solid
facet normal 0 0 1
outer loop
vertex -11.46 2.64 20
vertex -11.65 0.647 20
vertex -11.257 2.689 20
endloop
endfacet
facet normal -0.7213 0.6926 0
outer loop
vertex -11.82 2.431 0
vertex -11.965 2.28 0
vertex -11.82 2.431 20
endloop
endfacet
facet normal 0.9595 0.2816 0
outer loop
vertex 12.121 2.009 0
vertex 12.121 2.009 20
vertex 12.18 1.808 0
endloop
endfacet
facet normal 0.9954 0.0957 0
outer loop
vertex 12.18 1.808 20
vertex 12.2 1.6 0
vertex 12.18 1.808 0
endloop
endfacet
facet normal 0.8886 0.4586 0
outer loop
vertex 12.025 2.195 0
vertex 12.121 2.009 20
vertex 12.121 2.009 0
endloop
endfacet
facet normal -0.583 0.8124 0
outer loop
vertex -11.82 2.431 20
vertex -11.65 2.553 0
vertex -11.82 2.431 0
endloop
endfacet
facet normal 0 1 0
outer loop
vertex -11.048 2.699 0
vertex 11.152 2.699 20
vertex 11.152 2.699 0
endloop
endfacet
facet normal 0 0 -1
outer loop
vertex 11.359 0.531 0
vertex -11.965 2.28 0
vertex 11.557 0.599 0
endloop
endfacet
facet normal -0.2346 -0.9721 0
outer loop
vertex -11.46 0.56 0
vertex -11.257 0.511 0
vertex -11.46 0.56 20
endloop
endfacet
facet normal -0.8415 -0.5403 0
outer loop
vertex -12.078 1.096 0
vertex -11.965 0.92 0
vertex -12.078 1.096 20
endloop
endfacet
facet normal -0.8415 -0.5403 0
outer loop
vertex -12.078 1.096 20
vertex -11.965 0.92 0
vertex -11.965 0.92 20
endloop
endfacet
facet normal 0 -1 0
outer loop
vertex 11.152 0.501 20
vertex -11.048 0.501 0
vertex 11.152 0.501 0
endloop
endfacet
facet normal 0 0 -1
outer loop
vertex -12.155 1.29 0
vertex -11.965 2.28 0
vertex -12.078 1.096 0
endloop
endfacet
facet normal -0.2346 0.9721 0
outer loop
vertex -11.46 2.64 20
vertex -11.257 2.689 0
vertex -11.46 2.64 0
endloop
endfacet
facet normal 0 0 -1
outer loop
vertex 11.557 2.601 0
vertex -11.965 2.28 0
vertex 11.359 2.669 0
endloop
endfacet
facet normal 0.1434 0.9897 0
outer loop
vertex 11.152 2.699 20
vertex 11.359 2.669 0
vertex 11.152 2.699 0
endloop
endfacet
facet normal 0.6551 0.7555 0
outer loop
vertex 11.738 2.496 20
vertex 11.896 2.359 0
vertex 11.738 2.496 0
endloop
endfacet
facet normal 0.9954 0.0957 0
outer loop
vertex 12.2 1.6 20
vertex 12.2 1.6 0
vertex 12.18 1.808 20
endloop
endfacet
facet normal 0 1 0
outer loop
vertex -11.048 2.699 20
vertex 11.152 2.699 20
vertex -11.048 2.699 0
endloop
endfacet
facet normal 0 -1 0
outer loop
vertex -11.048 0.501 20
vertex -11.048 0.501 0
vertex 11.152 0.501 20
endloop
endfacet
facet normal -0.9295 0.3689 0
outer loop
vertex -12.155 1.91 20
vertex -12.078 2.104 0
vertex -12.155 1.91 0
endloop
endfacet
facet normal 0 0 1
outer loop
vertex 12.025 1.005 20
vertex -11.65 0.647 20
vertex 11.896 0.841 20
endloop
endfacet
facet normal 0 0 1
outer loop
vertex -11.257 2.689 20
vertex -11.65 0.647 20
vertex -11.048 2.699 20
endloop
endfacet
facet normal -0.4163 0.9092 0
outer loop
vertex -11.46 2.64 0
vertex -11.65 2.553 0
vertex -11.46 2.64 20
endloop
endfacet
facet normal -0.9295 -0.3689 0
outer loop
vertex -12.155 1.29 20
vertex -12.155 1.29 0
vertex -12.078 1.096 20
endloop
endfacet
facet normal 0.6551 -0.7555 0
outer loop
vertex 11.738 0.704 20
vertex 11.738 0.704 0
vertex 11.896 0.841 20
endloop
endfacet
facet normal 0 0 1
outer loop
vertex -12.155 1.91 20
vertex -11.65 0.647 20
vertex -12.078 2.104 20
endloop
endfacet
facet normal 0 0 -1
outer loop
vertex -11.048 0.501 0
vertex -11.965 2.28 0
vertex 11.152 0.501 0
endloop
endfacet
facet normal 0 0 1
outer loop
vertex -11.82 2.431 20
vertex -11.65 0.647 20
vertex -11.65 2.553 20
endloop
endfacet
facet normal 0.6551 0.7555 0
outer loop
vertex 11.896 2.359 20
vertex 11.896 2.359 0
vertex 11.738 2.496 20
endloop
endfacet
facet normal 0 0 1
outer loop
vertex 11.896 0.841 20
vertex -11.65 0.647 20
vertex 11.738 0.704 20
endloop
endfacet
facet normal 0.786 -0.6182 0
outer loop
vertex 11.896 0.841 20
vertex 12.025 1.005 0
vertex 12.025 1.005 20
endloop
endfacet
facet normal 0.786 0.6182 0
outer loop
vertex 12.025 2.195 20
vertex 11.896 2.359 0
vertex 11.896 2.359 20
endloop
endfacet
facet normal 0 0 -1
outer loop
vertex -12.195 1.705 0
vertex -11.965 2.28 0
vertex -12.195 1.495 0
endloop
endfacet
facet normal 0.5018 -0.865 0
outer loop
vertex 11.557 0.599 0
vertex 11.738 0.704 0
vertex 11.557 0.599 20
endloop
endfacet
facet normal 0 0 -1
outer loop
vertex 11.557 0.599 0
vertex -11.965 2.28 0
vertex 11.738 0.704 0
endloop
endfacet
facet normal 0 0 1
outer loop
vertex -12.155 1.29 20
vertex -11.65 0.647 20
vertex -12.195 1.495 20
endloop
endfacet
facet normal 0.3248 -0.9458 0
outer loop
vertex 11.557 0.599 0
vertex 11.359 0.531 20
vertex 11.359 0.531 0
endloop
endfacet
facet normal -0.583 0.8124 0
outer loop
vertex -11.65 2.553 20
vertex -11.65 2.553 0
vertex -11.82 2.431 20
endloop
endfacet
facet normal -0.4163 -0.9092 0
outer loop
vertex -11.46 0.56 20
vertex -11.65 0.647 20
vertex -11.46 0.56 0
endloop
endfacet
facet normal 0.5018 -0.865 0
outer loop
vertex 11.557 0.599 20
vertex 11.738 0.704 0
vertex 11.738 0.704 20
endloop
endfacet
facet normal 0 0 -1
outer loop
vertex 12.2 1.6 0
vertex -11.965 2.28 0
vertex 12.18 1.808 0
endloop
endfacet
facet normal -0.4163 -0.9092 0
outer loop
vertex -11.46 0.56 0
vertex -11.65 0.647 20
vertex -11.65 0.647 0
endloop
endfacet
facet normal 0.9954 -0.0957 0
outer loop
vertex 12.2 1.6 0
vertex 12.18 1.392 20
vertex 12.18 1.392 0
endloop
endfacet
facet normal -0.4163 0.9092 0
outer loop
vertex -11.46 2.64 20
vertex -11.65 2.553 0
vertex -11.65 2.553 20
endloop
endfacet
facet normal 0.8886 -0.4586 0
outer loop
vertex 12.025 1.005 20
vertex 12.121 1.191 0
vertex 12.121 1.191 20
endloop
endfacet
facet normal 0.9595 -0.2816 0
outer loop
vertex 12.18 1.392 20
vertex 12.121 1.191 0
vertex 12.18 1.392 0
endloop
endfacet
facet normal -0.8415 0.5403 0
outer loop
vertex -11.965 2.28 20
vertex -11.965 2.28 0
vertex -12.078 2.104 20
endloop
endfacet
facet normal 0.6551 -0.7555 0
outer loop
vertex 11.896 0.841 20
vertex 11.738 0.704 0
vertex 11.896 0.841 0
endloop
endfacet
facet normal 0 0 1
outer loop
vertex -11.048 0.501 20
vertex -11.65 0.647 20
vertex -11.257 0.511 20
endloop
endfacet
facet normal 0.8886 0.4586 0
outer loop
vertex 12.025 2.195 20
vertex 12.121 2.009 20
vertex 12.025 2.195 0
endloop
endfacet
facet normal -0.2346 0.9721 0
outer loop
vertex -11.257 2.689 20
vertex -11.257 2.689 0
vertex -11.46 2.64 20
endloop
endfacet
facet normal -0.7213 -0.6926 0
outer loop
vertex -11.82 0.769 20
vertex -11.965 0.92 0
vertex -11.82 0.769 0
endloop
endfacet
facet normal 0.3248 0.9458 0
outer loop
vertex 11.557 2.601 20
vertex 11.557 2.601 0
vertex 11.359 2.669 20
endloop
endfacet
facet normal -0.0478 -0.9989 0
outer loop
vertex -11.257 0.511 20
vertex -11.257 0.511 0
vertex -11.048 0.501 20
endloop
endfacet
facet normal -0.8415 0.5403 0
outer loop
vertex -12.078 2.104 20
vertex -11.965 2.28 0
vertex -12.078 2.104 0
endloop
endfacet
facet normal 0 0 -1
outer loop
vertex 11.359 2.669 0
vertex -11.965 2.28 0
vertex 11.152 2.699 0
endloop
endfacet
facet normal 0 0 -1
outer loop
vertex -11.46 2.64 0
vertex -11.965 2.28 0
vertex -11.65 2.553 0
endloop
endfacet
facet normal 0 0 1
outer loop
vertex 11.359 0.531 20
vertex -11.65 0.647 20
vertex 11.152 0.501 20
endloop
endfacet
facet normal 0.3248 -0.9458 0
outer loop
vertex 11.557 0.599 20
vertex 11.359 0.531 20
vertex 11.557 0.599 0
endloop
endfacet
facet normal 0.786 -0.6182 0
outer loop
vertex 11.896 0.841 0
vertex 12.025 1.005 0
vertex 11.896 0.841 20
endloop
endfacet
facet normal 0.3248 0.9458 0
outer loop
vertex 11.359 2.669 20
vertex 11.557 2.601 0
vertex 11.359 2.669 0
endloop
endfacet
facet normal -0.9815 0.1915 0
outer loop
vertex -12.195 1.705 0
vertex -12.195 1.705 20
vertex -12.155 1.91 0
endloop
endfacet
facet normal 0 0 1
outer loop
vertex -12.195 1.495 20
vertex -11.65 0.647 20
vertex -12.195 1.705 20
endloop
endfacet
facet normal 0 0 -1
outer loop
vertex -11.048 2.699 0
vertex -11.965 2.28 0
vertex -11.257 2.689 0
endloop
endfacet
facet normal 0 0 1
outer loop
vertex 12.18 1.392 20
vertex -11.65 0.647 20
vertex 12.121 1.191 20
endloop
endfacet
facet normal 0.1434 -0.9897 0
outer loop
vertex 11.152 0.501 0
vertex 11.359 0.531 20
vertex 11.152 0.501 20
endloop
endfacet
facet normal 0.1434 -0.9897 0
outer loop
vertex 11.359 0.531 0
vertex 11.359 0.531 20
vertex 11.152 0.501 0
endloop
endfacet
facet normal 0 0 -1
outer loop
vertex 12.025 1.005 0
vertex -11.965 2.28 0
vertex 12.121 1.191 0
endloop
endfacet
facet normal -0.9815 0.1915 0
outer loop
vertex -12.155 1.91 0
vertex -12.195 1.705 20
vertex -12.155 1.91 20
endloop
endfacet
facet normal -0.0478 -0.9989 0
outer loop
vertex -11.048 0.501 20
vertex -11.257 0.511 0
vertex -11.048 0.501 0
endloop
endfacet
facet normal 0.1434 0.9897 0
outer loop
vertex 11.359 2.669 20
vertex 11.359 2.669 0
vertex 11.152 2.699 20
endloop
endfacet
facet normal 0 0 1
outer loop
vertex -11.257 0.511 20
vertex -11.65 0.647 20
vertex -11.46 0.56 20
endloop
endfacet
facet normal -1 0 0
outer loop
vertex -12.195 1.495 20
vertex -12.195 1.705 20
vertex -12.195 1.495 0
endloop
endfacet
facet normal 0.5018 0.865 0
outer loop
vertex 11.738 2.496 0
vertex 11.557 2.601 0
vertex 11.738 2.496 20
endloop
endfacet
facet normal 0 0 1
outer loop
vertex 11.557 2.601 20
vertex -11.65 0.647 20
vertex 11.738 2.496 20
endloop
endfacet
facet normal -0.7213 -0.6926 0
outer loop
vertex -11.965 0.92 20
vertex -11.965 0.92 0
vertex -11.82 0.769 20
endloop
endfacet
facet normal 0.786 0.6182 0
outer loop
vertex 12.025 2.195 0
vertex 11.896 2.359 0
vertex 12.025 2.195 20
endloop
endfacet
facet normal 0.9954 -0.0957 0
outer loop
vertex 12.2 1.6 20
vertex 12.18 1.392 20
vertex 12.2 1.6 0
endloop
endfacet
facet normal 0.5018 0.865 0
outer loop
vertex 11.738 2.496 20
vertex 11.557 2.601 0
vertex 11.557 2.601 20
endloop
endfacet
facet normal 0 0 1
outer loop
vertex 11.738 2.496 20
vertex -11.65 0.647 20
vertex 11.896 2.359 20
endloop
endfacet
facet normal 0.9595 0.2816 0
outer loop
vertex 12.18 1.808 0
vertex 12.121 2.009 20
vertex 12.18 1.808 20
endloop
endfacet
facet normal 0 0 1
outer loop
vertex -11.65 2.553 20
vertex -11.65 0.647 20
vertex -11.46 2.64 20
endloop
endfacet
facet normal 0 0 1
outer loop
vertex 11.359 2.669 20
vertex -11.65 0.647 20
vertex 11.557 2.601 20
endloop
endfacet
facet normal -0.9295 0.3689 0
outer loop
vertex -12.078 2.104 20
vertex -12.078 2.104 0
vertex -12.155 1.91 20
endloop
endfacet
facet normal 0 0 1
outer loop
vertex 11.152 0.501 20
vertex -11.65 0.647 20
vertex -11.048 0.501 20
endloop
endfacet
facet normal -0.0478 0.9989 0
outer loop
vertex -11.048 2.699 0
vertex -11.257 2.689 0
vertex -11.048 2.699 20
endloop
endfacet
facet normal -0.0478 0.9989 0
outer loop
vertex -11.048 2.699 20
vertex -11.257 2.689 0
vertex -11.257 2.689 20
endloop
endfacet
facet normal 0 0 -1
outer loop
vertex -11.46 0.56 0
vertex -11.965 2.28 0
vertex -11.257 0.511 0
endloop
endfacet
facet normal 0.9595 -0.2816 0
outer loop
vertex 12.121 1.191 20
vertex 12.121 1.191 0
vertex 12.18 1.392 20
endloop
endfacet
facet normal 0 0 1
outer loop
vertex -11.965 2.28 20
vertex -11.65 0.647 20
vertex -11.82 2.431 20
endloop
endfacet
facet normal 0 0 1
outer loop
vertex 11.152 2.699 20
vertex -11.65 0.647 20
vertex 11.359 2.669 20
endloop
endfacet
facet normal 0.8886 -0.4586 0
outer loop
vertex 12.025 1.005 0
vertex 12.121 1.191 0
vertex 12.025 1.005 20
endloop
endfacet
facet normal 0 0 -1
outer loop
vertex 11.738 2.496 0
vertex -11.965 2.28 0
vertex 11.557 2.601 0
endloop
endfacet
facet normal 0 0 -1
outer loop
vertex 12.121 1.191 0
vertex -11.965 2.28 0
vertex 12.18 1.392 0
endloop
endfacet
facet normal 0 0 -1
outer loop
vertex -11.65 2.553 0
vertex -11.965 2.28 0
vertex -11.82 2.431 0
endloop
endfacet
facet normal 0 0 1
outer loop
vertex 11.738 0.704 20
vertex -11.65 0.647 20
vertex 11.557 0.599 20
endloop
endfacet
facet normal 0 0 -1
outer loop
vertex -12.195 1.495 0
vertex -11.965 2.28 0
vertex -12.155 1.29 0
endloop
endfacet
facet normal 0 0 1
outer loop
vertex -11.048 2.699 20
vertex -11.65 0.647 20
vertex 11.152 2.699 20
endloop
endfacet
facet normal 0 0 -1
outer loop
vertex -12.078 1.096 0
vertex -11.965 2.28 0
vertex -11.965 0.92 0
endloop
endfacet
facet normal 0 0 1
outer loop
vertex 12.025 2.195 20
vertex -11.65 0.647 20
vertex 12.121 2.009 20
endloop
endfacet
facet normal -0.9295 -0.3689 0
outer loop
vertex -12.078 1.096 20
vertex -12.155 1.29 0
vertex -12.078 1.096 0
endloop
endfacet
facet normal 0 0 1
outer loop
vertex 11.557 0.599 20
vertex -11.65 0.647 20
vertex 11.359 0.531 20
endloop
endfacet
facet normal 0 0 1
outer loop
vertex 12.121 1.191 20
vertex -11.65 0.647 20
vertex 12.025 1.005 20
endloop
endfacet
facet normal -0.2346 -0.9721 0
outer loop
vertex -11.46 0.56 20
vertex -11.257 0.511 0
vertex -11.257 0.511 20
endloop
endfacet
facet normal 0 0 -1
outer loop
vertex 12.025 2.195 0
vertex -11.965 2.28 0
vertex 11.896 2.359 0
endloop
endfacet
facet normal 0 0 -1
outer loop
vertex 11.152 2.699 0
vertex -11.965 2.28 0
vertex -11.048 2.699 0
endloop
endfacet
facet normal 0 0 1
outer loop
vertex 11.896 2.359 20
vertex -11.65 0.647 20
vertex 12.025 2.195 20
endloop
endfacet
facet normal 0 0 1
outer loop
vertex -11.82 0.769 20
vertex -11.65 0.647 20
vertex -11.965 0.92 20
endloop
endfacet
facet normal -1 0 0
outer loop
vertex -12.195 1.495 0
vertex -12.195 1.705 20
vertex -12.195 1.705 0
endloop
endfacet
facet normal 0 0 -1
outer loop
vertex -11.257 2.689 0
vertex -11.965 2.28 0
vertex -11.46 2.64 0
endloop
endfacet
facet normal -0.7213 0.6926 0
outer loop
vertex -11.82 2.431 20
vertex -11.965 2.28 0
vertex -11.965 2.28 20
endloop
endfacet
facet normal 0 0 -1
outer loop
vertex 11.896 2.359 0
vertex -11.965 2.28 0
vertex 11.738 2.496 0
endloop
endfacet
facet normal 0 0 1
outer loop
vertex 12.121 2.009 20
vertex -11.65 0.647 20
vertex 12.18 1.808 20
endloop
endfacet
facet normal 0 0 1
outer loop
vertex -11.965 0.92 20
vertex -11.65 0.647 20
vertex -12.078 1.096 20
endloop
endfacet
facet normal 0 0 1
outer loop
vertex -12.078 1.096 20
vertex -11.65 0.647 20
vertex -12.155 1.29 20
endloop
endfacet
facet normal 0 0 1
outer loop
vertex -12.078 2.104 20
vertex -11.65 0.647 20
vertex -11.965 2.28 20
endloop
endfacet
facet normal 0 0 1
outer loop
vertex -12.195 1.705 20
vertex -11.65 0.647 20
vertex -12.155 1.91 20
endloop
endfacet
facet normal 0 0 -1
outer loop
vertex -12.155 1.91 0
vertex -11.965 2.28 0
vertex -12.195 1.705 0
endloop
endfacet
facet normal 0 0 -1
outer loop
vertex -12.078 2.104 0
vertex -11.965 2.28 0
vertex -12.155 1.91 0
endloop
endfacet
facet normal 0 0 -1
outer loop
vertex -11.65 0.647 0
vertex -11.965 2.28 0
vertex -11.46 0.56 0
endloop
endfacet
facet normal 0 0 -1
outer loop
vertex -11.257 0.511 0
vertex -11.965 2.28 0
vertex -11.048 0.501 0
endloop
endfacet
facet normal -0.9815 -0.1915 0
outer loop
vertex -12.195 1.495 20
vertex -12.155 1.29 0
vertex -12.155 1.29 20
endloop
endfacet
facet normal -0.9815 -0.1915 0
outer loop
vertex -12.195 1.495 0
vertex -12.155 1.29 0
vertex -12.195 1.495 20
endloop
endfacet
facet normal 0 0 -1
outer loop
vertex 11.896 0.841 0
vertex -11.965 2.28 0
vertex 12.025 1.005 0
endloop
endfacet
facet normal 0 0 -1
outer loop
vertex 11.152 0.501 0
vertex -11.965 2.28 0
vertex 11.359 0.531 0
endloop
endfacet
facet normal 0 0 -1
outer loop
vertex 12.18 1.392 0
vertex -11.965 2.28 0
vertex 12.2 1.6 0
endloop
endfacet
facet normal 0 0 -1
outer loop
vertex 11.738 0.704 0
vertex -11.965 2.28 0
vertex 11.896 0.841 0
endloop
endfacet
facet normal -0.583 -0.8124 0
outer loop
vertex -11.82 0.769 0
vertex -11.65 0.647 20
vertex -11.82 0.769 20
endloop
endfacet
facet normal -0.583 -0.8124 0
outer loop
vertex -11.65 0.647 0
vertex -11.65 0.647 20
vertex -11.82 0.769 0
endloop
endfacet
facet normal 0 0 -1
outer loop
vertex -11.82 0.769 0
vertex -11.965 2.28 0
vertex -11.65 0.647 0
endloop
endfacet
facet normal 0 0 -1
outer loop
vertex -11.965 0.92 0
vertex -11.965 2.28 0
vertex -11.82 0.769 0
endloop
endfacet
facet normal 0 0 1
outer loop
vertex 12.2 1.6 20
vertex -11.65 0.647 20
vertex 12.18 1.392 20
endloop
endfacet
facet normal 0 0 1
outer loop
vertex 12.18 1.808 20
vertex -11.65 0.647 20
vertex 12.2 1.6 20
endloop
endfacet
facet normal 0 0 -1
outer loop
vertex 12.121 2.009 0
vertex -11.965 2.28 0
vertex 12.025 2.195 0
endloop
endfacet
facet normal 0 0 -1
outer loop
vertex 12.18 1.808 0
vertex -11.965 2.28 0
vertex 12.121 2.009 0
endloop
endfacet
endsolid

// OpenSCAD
// file: ../Parts/rounder.scad
// rounder.scad
// cutting tool for rounding off corners with a cylinder

//---------------------
module rounder(
r=10,   // radius
h=10,   // height
f=22,    // $fn
extra=0.01  // extra size for the cube
){

difference(){
  translate([-extra,-extra,-extra])
  cube([r+extra,r+extra,h+2*extra]);
  translate([r,r,-1])
  cylinder(r=r,h=h+2,$fn=f);
}

}

//---------------------------------------------------------------------------
module bevel(x=1,y=1,h=10){

linear_extrude(height=h)
polygon(points=[[0,0],[x,0],[0,y]]);
    
}
  

//========================

rounder();

//========================
// file: ../Parts/tslot.scad
//=================================================================================
// tslot
// models for tslots used in PrusaDusa
// 
// Tom Flint, 2020
//=================================================================================
module tslot1(
tol = 0.0,
len = 60,
type = 1
){
    
// 30x30     
if(type==1){
    linear_extrude(height=len,convexity=10)
    difference(){
        offset(r=2.0+tol,$fn=20)
        square([26,26],center=true);
 
        translate([0,12,0])
        square([8.2-tol,8.2-tol],center=true);
        translate([0,-12,0])
        square([8.2-tol,8.2-tol],center=true);
        translate([12,0,0])
        square([8.2-tol,8.2-tol],center=true);
        translate([-12,0,0])
        square([8.2-tol,8.2-tol],center=true);
    }
}
    
// 30x60
if(type==2){
    linear_extrude(height=len,convexity=10)
    difference(){
        offset(r=2.0+tol,$fn=20)
        square([26,56],center=true);
 
        translate([0,27,0])
        square([8.2-tol,8.2-tol],center=true);
        translate([0,-27,0])
        square([8.2-tol,8.2-tol],center=true);
        
        translate([12,15,0])
        square([8.2-tol,8.2-tol],center=true);
        translate([-12,15,0])
        square([8.2-tol,8.2-tol],center=true);

        translate([12,-15,0])
        square([8.2-tol,8.2-tol],center=true);
        translate([-12,-15,0])
        square([8.2-tol,8.2-tol],center=true);
    }
}
    
// 36x60
if(type==3){
    linear_extrude(height=len,convexity=10)
    difference(){
        offset(r=2.0+tol,$fn=20)
        square([56,56],center=true);
 
        translate([15,27,0])
        square([8.2-tol,8.2-tol],center=true);
        translate([15,-27,0])
        square([8.2-tol,8.2-tol],center=true);
        
        translate([-15,27,0])
        square([8.2-tol,8.2-tol],center=true);
        translate([-15,-27,0])
        square([8.2-tol,8.2-tol],center=true);
        
        translate([27,15,0])
        square([8.2-tol,8.2-tol],center=true);
        translate([-27,15,0])
        square([8.2-tol,8.2-tol],center=true);

        translate([27,-15,0])
        square([8.2-tol,8.2-tol],center=true);
        translate([-27,-15,0])
        square([8.2-tol,8.2-tol],center=true);
    }
}
    
}

//--------------------------------------
module tbrace(
tol=0.0
){

F2=22;
 
translate([0,0,2-15])    
difference(){    
union(){
        cube([4.8,60,26]);
        cube([60,4.8,26]);
    
    hull(){
        translate([60-2.4,4.8,0])
        cylinder(r=2.4,h=26,$fn=F2);
        translate([4.8,60-2.4,0])
        cylinder(r=2.4,h=26,$fn=F2);
    }
}    

        translate([15,0,26/2])
        rotate([-90,0,0])
        cylinder(r1=3.5,r2=4.5,h=60,$fn=F2);
        translate([15+30,0,26/2])
        rotate([-90,0,0])
        cylinder(r1=3.5,r2=4.5,h=60,$fn=F2);

        translate([0,15,26/2])
        rotate([0,90,0])
        cylinder(r1=3.5,r2=4.5,h=60,$fn=F2);
        translate([0,15+30,26/2])
        rotate([0,90,0])
        cylinder(r1=3.5,r2=4.5,h=60,$fn=F2);

}
}

//----------------------------------------
module lbrace(
tol=0,
holes=0,
nuts=1
){

F2=22;
    
pts1=[ [5,0], [80,0], [85,5], [85,22], [80,28],
    [28,28], [28,80], [22,85], [5,85], [0,80], [0,5] ];
    
if(holes==1){
    difference(){
        linear_extrude(height=3.25+tol,convexity=10)
        offset(r=tol)
        polygon(points=pts1);
        
        translate([16+30,14,-1])
        cylinder(r=3.25,h=5,$fn=F2);
        translate([16+60,14,-1])
        cylinder(r=3.25,h=5,$fn=F2);

        translate([14,16+30,-1])
        cylinder(r=3.25,h=5,$fn=F2);
        translate([14,16+60,-1])
        cylinder(r=3.25,h=5,$fn=F2);
    }
}else{
        linear_extrude(height=3.25+tol,convexity=10)
        offset(r=tol)
        polygon(points=pts1);
}

if(nuts==1){
    
        translate([16+30,14,0])
        cylinder(r=5,h=6+3.25,$fn=F2);
        translate([16+60,14,0])
        cylinder(r=5,h=6+3.25,$fn=F2);

        translate([14,16+30,0])
        cylinder(r=5,h=6+3.25,$fn=F2);
        translate([14,16+60,0])
        cylinder(r=5,h=6+3.25,$fn=F2);
}

}


//=======================================

lbrace();

translate([50,50,0])
lbrace(tol=0.2);

//tbrace();

/*
color("cyan")
tslot1(len=70);

color("green")
translate([0,15,0])
tslot1(type=2);

color("red")
translate([15,15,0])
tslot1(type=3,len=50);

*/

//=======================================
// main file
//=================================================================================
// LowBoy.scad
//
// Spacer for Longs Peak Pub refridgerator
//
// Dr Tom Flint, 13 March 2023
//=================================================================================


use <../Parts/tslot.scad>
use <../Parts/rounder.scad>

thick = 2.4;    // thickness of loop
thin = 0.9;     // thickness of the metal part
slot = 27;      // width of the slot
boss = 4.5;     // height of main boss
yoff= 1.6;      // offset for the tongue slot
tongue = 20;    // length of tongue

//---------------------------------------------------------------------------------
module Loop(){

  // around the metal
  difference(){
    union(){
      hull(){
        translate([slot/2,0,0])
        cylinder(r=thick+thin,h=boss,$fn=99);
        translate([-slot/2,0,0])
        cylinder(r=thick+thin,h=boss,$fn=99);
      }
      translate([0,yoff,0])
      hull(){
        translate([slot/2-thick,0,0])
        cylinder(r=thick+thin,h=boss,$fn=99);
        translate([-slot/2+thick,0,0])
        cylinder(r=thick+thin,h=boss,$fn=99);
      }
    }
    union(){
      hull(){
        translate([slot/2,0,0])
        cylinder(r=thin/2,h=3*boss,center=true,$fn=33);
        translate([-slot/2,0,0])
        cylinder(r=thin/2,h=3*boss,center=true,$fn=33);
      }
      translate([0,yoff,0])
      hull(){
        translate([slot/2-thick,0,0])
        cylinder(r=thick/2,h=3*boss,center=true,$fn=33);
        translate([-slot/2+thick,0,0])
        cylinder(r=thick/2,h=3*boss,center=true,$fn=33);
      }
    }
  }
  
  
}

//---------------------------------------------------------------------------------
module Tongue(tol=0.1){

      translate([0,yoff,tongue/2])
      hull(){
        translate([slot/2-thick,0,0])
        cylinder(r=thick/2-tol,h=tongue,center=true,$fn=33);
        translate([-slot/2+thick,0,0])
        cylinder(r=thick/2-tol,h=tongue,center=true,$fn=33);
      }

}
  
//=================================================================================
 

//Loop();
Tongue();
  
//=================================================================================
